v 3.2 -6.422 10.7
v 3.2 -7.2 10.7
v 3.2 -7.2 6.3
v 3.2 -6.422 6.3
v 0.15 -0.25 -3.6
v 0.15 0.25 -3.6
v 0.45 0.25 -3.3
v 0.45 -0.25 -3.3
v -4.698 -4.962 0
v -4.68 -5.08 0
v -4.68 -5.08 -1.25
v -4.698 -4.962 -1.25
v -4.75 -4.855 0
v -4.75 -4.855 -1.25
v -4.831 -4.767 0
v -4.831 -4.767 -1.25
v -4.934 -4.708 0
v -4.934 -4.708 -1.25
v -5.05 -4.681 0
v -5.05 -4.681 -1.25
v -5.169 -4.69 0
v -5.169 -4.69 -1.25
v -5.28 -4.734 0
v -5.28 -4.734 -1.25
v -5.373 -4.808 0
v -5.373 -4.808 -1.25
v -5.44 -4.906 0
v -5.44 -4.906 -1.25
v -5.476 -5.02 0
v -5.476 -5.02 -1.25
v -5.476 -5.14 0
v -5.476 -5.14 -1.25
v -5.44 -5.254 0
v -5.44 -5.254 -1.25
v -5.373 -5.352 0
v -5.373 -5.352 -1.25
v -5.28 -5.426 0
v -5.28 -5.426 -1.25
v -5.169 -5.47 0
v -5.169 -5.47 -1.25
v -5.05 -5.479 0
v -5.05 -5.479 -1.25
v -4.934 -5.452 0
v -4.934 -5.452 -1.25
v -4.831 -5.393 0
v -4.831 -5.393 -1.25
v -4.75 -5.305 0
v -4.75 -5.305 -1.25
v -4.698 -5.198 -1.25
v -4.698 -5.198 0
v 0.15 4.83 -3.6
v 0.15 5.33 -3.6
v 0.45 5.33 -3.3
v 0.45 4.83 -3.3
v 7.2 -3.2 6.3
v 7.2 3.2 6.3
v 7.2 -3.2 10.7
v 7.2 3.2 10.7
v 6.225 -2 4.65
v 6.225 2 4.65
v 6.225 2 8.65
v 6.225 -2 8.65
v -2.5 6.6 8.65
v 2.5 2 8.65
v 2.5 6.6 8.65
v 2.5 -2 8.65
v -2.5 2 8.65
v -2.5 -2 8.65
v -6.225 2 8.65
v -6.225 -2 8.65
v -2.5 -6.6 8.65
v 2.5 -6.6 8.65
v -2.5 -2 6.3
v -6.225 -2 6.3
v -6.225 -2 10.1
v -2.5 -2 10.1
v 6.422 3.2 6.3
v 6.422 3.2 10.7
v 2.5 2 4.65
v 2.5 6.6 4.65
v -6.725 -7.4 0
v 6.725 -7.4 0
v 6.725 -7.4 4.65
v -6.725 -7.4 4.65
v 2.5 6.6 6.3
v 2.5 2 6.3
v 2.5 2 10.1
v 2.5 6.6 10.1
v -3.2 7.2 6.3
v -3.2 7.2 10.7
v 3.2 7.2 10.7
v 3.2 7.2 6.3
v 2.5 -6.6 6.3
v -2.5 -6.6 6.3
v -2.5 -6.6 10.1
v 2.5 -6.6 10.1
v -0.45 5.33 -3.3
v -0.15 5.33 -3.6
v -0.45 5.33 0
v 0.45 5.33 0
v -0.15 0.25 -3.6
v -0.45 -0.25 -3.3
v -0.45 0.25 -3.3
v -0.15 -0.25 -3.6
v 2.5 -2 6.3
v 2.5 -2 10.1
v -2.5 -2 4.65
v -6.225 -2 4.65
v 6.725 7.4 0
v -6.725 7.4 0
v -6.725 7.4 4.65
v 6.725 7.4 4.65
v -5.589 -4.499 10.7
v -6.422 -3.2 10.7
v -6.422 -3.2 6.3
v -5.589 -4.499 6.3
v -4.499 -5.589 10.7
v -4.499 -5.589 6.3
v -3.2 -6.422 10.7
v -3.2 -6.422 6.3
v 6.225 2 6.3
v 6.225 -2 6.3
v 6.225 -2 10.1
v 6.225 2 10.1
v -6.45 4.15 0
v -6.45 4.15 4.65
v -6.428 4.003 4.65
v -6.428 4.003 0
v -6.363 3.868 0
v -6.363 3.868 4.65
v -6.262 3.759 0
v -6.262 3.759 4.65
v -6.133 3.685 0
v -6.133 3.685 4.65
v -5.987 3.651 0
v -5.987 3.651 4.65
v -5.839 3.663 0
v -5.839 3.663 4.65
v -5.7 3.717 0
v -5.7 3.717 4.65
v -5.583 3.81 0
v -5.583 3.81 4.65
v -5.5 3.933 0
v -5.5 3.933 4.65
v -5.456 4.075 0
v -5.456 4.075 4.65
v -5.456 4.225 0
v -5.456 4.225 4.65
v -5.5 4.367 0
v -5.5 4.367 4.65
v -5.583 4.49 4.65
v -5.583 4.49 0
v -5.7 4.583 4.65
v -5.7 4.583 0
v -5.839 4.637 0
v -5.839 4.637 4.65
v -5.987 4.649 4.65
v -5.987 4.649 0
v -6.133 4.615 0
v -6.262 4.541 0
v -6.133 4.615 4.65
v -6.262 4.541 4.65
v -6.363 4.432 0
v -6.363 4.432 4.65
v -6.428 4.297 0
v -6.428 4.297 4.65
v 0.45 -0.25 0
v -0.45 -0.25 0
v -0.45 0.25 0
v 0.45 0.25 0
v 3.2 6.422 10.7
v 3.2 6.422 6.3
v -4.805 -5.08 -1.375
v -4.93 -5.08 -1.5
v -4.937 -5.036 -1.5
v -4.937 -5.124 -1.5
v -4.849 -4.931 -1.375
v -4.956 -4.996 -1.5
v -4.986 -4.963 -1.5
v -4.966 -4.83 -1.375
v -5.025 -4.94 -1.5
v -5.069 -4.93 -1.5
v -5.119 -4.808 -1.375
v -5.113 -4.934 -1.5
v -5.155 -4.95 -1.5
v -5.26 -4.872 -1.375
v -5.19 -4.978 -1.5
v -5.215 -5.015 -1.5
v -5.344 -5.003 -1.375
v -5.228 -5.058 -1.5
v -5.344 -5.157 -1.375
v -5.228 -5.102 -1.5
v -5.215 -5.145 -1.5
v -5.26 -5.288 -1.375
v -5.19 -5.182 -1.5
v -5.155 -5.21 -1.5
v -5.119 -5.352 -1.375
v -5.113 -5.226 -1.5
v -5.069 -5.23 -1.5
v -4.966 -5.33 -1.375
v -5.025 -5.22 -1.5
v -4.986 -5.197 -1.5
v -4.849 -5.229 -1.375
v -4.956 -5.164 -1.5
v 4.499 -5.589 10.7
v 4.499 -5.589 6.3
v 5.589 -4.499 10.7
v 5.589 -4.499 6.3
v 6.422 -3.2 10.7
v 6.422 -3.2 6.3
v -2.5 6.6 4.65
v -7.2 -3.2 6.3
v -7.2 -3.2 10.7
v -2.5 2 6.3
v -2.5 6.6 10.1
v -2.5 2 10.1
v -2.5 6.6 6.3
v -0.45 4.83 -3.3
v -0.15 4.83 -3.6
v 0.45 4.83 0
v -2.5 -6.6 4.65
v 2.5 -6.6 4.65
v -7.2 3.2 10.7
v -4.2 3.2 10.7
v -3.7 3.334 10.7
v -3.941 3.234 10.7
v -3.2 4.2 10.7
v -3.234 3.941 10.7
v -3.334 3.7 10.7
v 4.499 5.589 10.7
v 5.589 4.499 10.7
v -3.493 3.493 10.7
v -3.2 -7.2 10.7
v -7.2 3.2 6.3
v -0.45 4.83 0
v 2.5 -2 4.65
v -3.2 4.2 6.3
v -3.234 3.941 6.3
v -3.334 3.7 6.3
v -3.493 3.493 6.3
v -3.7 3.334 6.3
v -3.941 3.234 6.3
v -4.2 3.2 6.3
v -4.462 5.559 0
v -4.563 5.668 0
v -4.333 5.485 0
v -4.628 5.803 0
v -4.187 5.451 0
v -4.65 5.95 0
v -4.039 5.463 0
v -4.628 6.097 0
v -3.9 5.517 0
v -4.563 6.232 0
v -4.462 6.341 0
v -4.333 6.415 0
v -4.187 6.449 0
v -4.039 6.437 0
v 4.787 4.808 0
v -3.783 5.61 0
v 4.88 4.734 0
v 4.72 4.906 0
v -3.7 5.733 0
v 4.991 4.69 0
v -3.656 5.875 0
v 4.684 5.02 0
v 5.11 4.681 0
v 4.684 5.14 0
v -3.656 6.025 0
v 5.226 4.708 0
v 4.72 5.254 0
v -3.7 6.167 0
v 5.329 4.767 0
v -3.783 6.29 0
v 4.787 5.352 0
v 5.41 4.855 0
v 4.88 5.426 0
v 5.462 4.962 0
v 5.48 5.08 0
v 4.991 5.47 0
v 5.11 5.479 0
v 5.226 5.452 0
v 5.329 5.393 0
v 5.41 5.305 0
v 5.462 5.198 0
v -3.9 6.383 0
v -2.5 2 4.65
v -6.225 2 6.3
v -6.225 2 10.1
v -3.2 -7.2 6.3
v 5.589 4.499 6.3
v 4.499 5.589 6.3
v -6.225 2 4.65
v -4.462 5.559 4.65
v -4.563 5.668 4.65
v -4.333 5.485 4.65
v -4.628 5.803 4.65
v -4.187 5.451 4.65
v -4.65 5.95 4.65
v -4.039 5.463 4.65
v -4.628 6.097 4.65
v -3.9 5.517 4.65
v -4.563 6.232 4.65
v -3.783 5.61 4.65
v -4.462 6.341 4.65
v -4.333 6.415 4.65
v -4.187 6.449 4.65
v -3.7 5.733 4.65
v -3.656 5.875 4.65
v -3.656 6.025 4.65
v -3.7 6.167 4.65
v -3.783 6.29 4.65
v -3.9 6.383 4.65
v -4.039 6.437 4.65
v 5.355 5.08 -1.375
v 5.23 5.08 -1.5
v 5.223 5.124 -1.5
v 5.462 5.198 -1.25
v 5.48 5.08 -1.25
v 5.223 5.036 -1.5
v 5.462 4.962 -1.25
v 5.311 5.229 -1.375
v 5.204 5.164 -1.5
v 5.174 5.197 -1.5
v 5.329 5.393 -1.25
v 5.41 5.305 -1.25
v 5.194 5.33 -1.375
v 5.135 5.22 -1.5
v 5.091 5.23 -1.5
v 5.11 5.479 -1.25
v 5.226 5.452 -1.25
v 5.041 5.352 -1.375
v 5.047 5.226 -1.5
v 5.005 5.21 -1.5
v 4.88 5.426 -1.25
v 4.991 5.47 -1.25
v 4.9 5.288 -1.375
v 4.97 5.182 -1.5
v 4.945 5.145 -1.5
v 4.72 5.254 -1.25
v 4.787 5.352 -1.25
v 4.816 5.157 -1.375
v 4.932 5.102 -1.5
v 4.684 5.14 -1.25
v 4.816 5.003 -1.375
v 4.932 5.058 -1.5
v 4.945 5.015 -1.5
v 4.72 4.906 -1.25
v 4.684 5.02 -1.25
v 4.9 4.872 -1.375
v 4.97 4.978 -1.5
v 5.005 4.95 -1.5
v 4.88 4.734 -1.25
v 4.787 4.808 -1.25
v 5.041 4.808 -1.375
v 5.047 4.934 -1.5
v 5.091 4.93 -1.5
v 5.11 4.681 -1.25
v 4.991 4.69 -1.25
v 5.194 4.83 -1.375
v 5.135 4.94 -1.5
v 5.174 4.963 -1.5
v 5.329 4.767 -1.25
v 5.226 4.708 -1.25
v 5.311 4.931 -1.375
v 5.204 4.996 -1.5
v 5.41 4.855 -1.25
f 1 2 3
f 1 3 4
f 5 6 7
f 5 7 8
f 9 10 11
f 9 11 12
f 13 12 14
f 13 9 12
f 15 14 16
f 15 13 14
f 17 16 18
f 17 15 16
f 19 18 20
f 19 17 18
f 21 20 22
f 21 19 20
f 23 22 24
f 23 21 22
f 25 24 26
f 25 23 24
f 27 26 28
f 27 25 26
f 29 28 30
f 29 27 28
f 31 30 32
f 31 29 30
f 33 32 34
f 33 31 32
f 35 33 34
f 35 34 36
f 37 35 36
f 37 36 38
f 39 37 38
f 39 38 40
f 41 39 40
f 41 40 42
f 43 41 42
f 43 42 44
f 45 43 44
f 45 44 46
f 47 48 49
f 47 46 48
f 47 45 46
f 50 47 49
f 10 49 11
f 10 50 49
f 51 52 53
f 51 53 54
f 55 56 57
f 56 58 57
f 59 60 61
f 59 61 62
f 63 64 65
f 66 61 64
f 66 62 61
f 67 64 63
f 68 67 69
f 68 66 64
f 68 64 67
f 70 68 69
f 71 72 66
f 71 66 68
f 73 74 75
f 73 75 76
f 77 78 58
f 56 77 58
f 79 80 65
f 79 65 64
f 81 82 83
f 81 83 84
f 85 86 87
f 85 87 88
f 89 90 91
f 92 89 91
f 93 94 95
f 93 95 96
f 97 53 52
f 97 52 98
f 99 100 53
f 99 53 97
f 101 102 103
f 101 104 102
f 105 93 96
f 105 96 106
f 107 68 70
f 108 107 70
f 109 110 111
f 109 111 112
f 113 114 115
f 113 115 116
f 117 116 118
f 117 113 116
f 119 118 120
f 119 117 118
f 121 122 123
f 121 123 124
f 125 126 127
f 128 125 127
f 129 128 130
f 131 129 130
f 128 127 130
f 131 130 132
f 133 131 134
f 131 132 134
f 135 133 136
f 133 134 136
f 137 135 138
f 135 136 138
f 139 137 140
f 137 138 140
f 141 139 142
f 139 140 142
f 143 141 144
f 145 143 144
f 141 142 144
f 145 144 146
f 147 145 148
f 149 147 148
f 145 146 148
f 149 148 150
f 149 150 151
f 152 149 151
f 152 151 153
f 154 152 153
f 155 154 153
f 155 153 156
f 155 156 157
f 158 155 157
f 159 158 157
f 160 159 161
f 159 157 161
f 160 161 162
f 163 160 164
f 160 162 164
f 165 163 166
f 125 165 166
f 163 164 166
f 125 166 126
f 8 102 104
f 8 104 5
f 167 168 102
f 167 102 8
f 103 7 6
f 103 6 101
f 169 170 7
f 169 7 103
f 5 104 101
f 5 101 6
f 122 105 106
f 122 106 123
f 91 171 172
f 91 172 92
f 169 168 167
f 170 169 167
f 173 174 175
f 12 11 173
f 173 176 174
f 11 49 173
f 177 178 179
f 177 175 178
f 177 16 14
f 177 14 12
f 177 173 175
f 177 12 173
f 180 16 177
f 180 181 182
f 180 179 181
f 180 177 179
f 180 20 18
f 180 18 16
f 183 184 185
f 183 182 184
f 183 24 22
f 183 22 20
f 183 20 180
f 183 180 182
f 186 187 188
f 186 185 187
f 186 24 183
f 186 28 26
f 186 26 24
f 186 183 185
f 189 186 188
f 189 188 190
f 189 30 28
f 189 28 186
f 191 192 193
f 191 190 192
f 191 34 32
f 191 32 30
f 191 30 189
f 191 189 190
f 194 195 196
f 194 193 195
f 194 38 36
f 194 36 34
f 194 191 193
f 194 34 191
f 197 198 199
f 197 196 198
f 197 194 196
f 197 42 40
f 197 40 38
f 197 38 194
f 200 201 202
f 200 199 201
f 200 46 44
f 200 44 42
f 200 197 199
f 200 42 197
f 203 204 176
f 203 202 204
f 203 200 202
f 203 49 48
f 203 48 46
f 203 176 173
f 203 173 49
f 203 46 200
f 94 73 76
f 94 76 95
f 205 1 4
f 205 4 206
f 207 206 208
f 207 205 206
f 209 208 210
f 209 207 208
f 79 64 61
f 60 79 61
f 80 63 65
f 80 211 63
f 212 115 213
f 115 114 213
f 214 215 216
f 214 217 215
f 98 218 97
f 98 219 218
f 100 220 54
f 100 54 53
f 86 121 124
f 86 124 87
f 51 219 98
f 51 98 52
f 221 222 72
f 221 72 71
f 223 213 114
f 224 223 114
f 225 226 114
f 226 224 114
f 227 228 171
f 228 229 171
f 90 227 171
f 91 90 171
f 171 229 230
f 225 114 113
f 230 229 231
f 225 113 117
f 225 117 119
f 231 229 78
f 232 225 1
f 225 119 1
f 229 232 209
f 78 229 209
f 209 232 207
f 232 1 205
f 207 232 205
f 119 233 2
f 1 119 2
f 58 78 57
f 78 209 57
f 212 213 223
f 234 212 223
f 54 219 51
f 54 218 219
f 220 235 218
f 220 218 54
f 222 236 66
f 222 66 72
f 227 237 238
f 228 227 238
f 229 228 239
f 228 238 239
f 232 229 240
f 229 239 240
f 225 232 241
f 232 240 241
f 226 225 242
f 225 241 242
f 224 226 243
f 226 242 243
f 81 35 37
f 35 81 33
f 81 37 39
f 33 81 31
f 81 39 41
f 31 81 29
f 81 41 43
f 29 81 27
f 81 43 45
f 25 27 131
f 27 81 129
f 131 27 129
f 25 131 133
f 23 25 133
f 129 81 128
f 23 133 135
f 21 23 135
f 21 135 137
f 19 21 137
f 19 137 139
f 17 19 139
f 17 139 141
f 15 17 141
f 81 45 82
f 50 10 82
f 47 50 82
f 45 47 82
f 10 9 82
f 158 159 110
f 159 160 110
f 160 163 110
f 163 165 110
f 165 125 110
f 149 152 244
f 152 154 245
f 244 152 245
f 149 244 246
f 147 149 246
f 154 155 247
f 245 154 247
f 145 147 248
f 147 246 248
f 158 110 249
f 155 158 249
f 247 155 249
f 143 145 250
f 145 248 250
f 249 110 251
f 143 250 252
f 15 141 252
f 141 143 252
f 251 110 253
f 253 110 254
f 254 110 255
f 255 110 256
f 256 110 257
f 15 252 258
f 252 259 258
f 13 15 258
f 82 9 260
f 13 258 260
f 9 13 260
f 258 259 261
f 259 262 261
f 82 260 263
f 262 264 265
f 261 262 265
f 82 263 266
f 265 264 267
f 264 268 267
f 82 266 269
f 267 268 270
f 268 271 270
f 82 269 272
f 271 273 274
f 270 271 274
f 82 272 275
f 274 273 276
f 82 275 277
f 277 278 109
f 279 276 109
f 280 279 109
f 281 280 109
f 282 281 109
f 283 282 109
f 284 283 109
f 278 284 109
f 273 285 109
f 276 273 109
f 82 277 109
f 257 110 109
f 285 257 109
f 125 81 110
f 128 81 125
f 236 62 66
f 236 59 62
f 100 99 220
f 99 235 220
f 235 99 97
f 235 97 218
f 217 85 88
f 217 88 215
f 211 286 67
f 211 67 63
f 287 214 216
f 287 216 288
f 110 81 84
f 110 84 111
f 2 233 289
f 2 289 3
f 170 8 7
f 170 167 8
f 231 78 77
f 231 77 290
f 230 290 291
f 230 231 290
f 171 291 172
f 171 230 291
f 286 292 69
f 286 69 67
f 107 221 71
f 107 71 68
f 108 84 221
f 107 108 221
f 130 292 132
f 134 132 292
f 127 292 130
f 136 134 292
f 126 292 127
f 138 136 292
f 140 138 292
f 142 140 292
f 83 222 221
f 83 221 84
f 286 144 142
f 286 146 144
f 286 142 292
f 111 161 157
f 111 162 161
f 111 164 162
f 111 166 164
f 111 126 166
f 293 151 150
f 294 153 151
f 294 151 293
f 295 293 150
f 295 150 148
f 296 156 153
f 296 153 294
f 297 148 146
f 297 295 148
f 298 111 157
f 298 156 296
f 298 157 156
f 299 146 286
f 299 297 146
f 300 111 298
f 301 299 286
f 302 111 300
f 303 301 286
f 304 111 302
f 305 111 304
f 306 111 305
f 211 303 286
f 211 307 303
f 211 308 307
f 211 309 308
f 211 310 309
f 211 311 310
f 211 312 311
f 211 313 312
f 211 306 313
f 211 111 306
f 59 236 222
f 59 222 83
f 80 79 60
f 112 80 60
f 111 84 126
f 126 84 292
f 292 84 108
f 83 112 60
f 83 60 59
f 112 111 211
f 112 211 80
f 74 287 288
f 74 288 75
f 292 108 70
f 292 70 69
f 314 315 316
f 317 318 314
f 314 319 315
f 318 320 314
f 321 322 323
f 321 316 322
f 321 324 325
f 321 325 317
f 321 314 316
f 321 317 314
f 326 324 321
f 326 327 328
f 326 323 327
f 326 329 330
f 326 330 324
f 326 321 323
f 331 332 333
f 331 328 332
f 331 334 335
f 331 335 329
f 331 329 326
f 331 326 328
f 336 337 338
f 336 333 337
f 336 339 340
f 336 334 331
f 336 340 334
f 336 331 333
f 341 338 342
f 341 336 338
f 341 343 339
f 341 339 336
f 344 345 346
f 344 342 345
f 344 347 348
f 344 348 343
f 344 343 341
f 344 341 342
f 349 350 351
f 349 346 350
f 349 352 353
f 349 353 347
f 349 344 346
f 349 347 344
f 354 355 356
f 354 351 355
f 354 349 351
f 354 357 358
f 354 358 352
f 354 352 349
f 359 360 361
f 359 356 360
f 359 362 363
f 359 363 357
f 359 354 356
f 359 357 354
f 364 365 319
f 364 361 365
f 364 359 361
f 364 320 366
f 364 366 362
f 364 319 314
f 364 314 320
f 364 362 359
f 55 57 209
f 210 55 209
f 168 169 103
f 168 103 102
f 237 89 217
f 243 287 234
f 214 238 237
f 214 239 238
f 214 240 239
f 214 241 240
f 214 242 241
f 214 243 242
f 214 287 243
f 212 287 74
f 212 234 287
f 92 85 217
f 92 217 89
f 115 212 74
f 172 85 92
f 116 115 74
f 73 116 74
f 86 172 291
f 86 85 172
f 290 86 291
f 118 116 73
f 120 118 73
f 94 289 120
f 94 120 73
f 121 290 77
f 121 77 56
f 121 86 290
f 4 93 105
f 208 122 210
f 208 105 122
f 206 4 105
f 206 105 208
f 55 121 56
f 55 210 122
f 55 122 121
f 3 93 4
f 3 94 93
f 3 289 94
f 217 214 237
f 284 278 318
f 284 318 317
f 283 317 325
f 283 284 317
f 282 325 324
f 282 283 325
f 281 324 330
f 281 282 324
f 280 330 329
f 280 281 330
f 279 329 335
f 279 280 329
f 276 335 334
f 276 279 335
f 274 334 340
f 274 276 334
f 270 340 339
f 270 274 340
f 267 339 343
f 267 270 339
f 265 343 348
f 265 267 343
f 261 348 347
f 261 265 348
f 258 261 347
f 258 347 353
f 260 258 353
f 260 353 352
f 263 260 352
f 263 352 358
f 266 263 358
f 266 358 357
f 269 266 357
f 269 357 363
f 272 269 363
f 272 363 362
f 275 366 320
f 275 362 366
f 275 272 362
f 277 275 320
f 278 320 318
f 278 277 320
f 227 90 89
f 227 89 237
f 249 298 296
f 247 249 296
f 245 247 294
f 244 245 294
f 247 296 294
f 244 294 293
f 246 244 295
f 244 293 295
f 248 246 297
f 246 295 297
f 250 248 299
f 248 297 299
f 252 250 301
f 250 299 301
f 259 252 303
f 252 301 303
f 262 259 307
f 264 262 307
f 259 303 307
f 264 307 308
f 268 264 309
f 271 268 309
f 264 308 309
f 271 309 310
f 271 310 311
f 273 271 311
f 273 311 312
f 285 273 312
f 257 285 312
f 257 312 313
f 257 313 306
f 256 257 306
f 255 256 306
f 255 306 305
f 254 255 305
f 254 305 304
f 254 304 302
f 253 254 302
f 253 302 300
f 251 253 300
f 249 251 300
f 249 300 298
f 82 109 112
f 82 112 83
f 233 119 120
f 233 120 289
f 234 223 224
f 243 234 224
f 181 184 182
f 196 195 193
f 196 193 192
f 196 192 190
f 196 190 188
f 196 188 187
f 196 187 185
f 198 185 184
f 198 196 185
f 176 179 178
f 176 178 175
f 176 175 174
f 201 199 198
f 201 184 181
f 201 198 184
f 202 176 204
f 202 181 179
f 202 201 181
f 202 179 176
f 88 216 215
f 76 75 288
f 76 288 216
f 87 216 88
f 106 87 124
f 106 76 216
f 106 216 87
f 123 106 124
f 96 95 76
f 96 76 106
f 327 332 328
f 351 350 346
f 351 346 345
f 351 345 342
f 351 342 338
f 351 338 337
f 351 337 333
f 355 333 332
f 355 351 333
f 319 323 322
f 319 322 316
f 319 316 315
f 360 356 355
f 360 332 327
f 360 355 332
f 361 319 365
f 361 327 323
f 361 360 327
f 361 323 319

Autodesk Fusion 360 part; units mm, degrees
sketch "Sketch1" plane through (0, 0, 0) normal (0, 0, 1) x (1, 0, 0) in component "Base"
  line L0 (6.725, -7.4) -> (-6.725, -7.4)
  line L1 (-6.725, -7.4) -> (-6.725, 7.4)
  line L2 (-6.725, 7.4) -> (6.725, 7.4)
  line L3 (6.725, 7.4) -> (6.725, -7.4)
  line L4 (6.725, -7.4) -> (-6.725, 7.4) construction
  line L5 (-6.725, -7.4) -> (6.725, 7.4) construction
  dimension "d1" = 13.45
  dimension "d2" = 14.8
extrude "Extrude1" add sketch "Sketch1" along normal blind 4.65 makes body 1 in component "Base"
sketch "Sketch2" plane through (0, 0, 4.65) normal (0, 0, 1) x (-1, 0, 0) in component "Base"
  line L0 (-6.725, -7.4) -> (6.725, -7.4)
  line L1 (6.725, -7.4) -> (6.725, 7.4)
  line L2 (6.725, 7.4) -> (-6.725, 7.4)
  line L3 (-6.725, 7.4) -> (-6.725, -7.4)
  line L4 (0, -7.4) -> (0, 7.4) construction
  line L5 (6.725, 0) -> (-6.725, 0) construction
  line L6 (2.5, -6.6) -> (1.8392, -6.6)
  line L7 (1.8392, -6.6) -> (-2.5, -6.6)
  line L8 (-2.5, -6.6) -> (-2.5, -2)
  line L9 (-2.5, -2) -> (-6.225, -2)
  line L10 (-6.225, -2) -> (-6.225, 2)
  line L11 (-6.225, 2) -> (-2.5, 2)
  line L12 (-2.5, 2) -> (-2.5, 6.6)
  line L13 (-2.5, 6.6) -> (2.5, 6.6)
  line L14 (2.5, 6.6) -> (2.5, 2)
  line L15 (2.5, 2) -> (6.225, 2)
  line L16 (6.225, 2) -> (6.225, -2)
  line L17 (6.225, -2) -> (2.5, -2)
  line L18 (2.5, -2) -> (2.5, -6.6)
  dimension "d5" = 4
  dimension "d6" = 5
  dimension "d7" = 0.8
  dimension "d8" = 0.8
  dimension "d9" = 0.5
extrude "Extrude2" add sketch "Sketch2" along normal blind 4 contours L6 L7 L8 L9 L10 L11 L12 L13 L14 L15 L16 L17 L18 bodies 1 in component "Base"
sketch "Sketch3" plane through (0, 0, 0) normal (0, 0, -1) x (1, 0, 0) in component "Base"
  line L0 (-6.725, -7.4) -> (6.725, -7.4)
  line L1 (6.725, -7.4) -> (6.725, 7.4)
  line L2 (6.725, 7.4) -> (-6.725, 7.4)
  line L3 (-6.725, 7.4) -> (-6.725, -7.4)
  circle A0 centre (5.08, -5.08) radius 0.4
  circle A1 centre (-5.08, 5.08) radius 0.4
  dimension "d12" = 0.8
  dimension "d13" = 5.08
  dimension "d14" = 5.08
  dimension "d15" = 5.08
  dimension "d16" = 5.08
extrude "Extrude3" add sketch "Sketch3" along normal blind 1.5 contours A0 | A1 bodies 1 in component "Base"
chamfer "Chamfer1" distance 0.25 angle 45 2 edges at (-5.4529, -4.9354, -1.5) (4.7071, 5.2246, -1.5) on bodies 1 in component "Base"
sketch "Sketch4" plane through (0, 0, 4.65) normal (0, 0, 1) x (-1, 0, 0) in component "Base"
  line L0 (2.5, -2) -> (2.5, -6.6)
  line L1 (2.5, -6.6) -> (-2.5, -6.6)
  line L2 (-2.5, -6.6) -> (-2.5, -2)
  line L3 (-2.5, -2) -> (-6.225, -2)
  line L4 (-6.225, -2) -> (-6.225, 2)
  line L5 (-6.225, 2) -> (-2.5, 2)
  line L6 (-2.5, 2) -> (-2.5, 6.6)
  line L7 (-2.5, 6.6) -> (2.5, 6.6)
  line L8 (2.5, 6.6) -> (2.5, 2)
  line L9 (2.5, 2) -> (6.225, 2)
  line L10 (6.225, 2) -> (6.225, -2)
  line L11 (6.225, -2) -> (2.5, -2)
  line L12 (-6.725, -7.4) -> (6.725, -7.4)
  line L13 (6.725, -7.4) -> (6.725, 7.4)
  line L14 (6.725, 7.4) -> (-6.725, 7.4)
  line L15 (-6.725, 7.4) -> (-6.725, -7.4)
  circle A0 centre (4.15, -5.95) radius 0.5
  circle A1 centre (5.95, -4.15) radius 0.5
  dimension "d20" = 1
  dimension "d21" = 4.15
  dimension "d22" = 5.95
  dimension "d23" = 4.15
  dimension "d24" = 5.95
extrude "Extrude4" cut sketch "Sketch4" against normal through all contours A0 | A1 bodies 1 in component "Base"
ref_plane "WorkPlane1" through (0, 0, 10.7) normal (0, 0, -1) x (-1, 0, 0) in component "Plunger"
sketch "Sketch1 (2)" plane through (0, 0, 10.7) normal (0, 0, -1) x (1, 0, 0) in component "Plunger"
  line L0 (7.2, 7.2) -> (-7.2, 7.2) construction
  line L1 (-7.2, 7.2) -> (-7.2, -7.2) construction
  line L2 (-7.2, -7.2) -> (7.2, -7.2) construction
  line L3 (7.2, -7.2) -> (7.2, 7.2) construction
  line L4 (7.2, 7.2) -> (-7.2, -7.2) construction
  line L5 (-7.2, 7.2) -> (7.2, -7.2) construction
  line L6 (0, -7.2) -> (0, 7.2) construction
  line L7 (-7.2, 0) -> (7.2, 0) construction
  line L8 (-3.2, 7.2) -> (3.2, 7.2)
  line L9 (-3.2, -7.2) -> (3.2, -7.2)
  line L10 (7.2, -3.2) -> (7.2, 3.2)
  line L11 (-7.2, 3.2) -> (-7.2, -3.2)
  arc A0 (6.4219, 3.2) -> (3.2, 6.4219) centre (0, 0) ccw
  line L12 (7.2, 3.2) -> (6.4219, 3.2)
  line L13 (3.2, 7.2) -> (3.2, 6.4219)
  arc A1 (3.2, -6.4219) -> (6.4219, -3.2) centre (0, 0) ccw
  arc A2 (-3.2, 6.4219) -> (-6.4219, 3.2) centre (0, 0) ccw
  line L14 (-6.4219, 3.2) -> (-7.2, 3.2)
  line L15 (-3.2, 6.4219) -> (-3.2, 7.2)
  line L16 (6.4219, -3.2) -> (7.2, -3.2)
  line L17 (3.2, -6.4219) -> (3.2, -7.2)
  line L18 (-3.2, -7.2) -> (-3.2, -3.2)
  line L19 (-7.2, -3.2) -> (-3.2, -3.2)
  dimension "d33" = 14.4
  dimension "d34" = 14.4
  dimension "d35" = 6.4
  dimension "d36" = 6.4
  dimension "d37" = 6.4
  dimension "d38" = 6.4
  dimension "d39" = 7.175
  dimension "d40" = 0.7781
  dimension "d41" = 0.7781
  dimension "d42" = 7.175
  dimension "d43" = 7.175
extrude "Extrude1'" add sketch "Sketch1 (2)" along normal blind 4.4 separate body makes body 2 in component "Plunger"
fillet "Fillet1" radius 1 1 edges at (-3.2, 3.2, 8.5) on bodies 2 in component "Plunger"
sketch "Sketch2 (2)" plane through (0, 0, 6.3) normal (0, 0, -1) x (1, 0, 0) in component "Plunger"
  arc A0 (-3.2, 6.4219) -> (-6.4219, 3.2) centre (0, 0) ccw
  line L0 (-6.4219, 3.2) -> (-7.2, 3.2)
  line L1 (-7.2, 3.2) -> (-7.2, -3.2)
  line L2 (-7.2, -3.2) -> (-4.2, -3.2)
  arc A1 (-3.2, -4.2) -> (-4.2, -3.2) centre (-4.2, -4.2) ccw
  line L3 (-3.2, -4.2) -> (-3.2, -7.2)
  line L4 (-3.2, -7.2) -> (3.2, -7.2)
  line L5 (3.2, -7.2) -> (3.2, -6.4219)
  arc A2 (3.2, -6.4219) -> (6.4219, -3.2) centre (0, 0) ccw
  line L6 (6.4219, -3.2) -> (7.2, -3.2)
  line L7 (7.2, -3.2) -> (7.2, 3.2)
  line L8 (7.2, 3.2) -> (6.4219, 3.2)
  arc A3 (6.4219, 3.2) -> (3.2, 6.4219) centre (0, 0) ccw
  line L9 (3.2, 6.4219) -> (3.2, 7.2)
  line L10 (3.2, 7.2) -> (-3.2, 7.2)
  line L11 (-3.2, 7.2) -> (-3.2, 6.4219)
  line L12 (-2.5, -2) -> (-6.225, -2)
  line L13 (-6.225, -2) -> (-6.225, 2)
  line L14 (-6.225, 2) -> (-2.5, 2)
  line L15 (-2.5, 2) -> (-2.5, 6.6)
  line L16 (-2.5, 6.6) -> (2.5, 6.6)
  line L17 (2.5, 6.6) -> (2.5, 2)
  line L18 (2.5, 2) -> (6.225, 2)
  line L19 (6.225, 2) -> (6.225, -2)
  line L20 (6.225, -2) -> (2.5, -2)
  line L21 (2.5, -2) -> (2.5, -6.6)
  line L22 (2.5, -6.6) -> (-2.5, -6.6)
  line L23 (-2.5, -6.6) -> (-2.5, -2)
extrude "Extrude2'" cut sketch "Sketch2 (2)" against normal blind 3.8 contours L12 L13 L14 L15 L16 L17 L18 L19 L20 L21 L22 L23 bodies 2 in component "Plunger"
sketch "Sketch1 (3)" plane through (0, 0, 0) normal (0, 0, -1) x (1, 0, 0) in component "PIns"
  circle A0 centre (-4.15, -5.95) radius 0.5
  circle A1 centre (-5.95, -4.15) radius 0.5
  circle A2 centre (-5.08, 5.08) radius 0.4
  circle A3 centre (5.08, -5.08) radius 0.4
  line L0 (-6.725, -7.4) -> (6.725, -7.4)
  line L1 (6.725, -7.4) -> (6.725, 7.4)
  line L2 (6.725, 7.4) -> (-6.725, 7.4)
  line L3 (-6.725, 7.4) -> (-6.725, -7.4)
  line L4 (0, 0) -> (0, -7.4) construction
  line L5 (0.45, -0.25) -> (-0.45, -0.25)
  line L6 (-0.45, -0.25) -> (-0.45, 0.25)
  line L7 (-0.45, 0.25) -> (0.45, 0.25)
  line L8 (0.45, 0.25) -> (0.45, -0.25)
  line L9 (0.45, -0.25) -> (-0.45, 0.25) construction
  line L10 (-0.45, -0.25) -> (0.45, 0.25) construction
  line L11 (0.45, -5.33) -> (-0.45, -5.33)
  line L12 (-0.45, -5.33) -> (-0.45, -4.83)
  line L13 (-0.45, -4.83) -> (0.45, -4.83)
  line L14 (0.45, -4.83) -> (0.45, -5.33)
  line L15 (0.45, -5.33) -> (-0.45, -4.83) construction
  line L16 (-0.45, -5.33) -> (0.45, -4.83) construction
  point P0 (0, -5.08)
  dimension "d50" = 0.9
  dimension "d51" = 0.5
  dimension "d52" = 0.5
  dimension "d53" = 0.9
  dimension "d54" = 5.08
extrude "Extrude1''" add sketch "Sketch1 (3)" along normal blind 3.6 separate body contours L5 L6 L7 L8 | L11 L12 L13 L14 makes body 3 at (0.15, 0.25, -1.2) makes body 4 at (-0.15, 4.83, -1.2) in component "PIns"
chamfer "Chamfer1'" distance 0.3 angle 45 4 edges at (-0.45, 0, -3.6) (0.45, 0, -3.6) (-0.45, 5.08, -3.6) (0.45, 5.08, -3.6) on bodies 3 4 in component "PIns"
component "Base" placed x (1, 0, 0) y (0, 1, 0) z (0, 0, 1) at (0, 0, 0)
component "Plunger" placed x (1, 0, 0) y (0, 1, 0) z (0, 0, 1) at (0, 0, 0)
component "PIns" placed x (1, 0, 0) y (0, 1, 0) z (0, 0, 1) at (0, 0, 0)
equation "d8 = d7"
equation "d15 = d13"
equation "d16 = d14"
equation "d36 = d35"
equation "d37 = d35"
equation "d38 = d35"
equation "d42 = d39"
equation "d43 = d39"
equation "d52 = d51"
equation "d53 = d50"
